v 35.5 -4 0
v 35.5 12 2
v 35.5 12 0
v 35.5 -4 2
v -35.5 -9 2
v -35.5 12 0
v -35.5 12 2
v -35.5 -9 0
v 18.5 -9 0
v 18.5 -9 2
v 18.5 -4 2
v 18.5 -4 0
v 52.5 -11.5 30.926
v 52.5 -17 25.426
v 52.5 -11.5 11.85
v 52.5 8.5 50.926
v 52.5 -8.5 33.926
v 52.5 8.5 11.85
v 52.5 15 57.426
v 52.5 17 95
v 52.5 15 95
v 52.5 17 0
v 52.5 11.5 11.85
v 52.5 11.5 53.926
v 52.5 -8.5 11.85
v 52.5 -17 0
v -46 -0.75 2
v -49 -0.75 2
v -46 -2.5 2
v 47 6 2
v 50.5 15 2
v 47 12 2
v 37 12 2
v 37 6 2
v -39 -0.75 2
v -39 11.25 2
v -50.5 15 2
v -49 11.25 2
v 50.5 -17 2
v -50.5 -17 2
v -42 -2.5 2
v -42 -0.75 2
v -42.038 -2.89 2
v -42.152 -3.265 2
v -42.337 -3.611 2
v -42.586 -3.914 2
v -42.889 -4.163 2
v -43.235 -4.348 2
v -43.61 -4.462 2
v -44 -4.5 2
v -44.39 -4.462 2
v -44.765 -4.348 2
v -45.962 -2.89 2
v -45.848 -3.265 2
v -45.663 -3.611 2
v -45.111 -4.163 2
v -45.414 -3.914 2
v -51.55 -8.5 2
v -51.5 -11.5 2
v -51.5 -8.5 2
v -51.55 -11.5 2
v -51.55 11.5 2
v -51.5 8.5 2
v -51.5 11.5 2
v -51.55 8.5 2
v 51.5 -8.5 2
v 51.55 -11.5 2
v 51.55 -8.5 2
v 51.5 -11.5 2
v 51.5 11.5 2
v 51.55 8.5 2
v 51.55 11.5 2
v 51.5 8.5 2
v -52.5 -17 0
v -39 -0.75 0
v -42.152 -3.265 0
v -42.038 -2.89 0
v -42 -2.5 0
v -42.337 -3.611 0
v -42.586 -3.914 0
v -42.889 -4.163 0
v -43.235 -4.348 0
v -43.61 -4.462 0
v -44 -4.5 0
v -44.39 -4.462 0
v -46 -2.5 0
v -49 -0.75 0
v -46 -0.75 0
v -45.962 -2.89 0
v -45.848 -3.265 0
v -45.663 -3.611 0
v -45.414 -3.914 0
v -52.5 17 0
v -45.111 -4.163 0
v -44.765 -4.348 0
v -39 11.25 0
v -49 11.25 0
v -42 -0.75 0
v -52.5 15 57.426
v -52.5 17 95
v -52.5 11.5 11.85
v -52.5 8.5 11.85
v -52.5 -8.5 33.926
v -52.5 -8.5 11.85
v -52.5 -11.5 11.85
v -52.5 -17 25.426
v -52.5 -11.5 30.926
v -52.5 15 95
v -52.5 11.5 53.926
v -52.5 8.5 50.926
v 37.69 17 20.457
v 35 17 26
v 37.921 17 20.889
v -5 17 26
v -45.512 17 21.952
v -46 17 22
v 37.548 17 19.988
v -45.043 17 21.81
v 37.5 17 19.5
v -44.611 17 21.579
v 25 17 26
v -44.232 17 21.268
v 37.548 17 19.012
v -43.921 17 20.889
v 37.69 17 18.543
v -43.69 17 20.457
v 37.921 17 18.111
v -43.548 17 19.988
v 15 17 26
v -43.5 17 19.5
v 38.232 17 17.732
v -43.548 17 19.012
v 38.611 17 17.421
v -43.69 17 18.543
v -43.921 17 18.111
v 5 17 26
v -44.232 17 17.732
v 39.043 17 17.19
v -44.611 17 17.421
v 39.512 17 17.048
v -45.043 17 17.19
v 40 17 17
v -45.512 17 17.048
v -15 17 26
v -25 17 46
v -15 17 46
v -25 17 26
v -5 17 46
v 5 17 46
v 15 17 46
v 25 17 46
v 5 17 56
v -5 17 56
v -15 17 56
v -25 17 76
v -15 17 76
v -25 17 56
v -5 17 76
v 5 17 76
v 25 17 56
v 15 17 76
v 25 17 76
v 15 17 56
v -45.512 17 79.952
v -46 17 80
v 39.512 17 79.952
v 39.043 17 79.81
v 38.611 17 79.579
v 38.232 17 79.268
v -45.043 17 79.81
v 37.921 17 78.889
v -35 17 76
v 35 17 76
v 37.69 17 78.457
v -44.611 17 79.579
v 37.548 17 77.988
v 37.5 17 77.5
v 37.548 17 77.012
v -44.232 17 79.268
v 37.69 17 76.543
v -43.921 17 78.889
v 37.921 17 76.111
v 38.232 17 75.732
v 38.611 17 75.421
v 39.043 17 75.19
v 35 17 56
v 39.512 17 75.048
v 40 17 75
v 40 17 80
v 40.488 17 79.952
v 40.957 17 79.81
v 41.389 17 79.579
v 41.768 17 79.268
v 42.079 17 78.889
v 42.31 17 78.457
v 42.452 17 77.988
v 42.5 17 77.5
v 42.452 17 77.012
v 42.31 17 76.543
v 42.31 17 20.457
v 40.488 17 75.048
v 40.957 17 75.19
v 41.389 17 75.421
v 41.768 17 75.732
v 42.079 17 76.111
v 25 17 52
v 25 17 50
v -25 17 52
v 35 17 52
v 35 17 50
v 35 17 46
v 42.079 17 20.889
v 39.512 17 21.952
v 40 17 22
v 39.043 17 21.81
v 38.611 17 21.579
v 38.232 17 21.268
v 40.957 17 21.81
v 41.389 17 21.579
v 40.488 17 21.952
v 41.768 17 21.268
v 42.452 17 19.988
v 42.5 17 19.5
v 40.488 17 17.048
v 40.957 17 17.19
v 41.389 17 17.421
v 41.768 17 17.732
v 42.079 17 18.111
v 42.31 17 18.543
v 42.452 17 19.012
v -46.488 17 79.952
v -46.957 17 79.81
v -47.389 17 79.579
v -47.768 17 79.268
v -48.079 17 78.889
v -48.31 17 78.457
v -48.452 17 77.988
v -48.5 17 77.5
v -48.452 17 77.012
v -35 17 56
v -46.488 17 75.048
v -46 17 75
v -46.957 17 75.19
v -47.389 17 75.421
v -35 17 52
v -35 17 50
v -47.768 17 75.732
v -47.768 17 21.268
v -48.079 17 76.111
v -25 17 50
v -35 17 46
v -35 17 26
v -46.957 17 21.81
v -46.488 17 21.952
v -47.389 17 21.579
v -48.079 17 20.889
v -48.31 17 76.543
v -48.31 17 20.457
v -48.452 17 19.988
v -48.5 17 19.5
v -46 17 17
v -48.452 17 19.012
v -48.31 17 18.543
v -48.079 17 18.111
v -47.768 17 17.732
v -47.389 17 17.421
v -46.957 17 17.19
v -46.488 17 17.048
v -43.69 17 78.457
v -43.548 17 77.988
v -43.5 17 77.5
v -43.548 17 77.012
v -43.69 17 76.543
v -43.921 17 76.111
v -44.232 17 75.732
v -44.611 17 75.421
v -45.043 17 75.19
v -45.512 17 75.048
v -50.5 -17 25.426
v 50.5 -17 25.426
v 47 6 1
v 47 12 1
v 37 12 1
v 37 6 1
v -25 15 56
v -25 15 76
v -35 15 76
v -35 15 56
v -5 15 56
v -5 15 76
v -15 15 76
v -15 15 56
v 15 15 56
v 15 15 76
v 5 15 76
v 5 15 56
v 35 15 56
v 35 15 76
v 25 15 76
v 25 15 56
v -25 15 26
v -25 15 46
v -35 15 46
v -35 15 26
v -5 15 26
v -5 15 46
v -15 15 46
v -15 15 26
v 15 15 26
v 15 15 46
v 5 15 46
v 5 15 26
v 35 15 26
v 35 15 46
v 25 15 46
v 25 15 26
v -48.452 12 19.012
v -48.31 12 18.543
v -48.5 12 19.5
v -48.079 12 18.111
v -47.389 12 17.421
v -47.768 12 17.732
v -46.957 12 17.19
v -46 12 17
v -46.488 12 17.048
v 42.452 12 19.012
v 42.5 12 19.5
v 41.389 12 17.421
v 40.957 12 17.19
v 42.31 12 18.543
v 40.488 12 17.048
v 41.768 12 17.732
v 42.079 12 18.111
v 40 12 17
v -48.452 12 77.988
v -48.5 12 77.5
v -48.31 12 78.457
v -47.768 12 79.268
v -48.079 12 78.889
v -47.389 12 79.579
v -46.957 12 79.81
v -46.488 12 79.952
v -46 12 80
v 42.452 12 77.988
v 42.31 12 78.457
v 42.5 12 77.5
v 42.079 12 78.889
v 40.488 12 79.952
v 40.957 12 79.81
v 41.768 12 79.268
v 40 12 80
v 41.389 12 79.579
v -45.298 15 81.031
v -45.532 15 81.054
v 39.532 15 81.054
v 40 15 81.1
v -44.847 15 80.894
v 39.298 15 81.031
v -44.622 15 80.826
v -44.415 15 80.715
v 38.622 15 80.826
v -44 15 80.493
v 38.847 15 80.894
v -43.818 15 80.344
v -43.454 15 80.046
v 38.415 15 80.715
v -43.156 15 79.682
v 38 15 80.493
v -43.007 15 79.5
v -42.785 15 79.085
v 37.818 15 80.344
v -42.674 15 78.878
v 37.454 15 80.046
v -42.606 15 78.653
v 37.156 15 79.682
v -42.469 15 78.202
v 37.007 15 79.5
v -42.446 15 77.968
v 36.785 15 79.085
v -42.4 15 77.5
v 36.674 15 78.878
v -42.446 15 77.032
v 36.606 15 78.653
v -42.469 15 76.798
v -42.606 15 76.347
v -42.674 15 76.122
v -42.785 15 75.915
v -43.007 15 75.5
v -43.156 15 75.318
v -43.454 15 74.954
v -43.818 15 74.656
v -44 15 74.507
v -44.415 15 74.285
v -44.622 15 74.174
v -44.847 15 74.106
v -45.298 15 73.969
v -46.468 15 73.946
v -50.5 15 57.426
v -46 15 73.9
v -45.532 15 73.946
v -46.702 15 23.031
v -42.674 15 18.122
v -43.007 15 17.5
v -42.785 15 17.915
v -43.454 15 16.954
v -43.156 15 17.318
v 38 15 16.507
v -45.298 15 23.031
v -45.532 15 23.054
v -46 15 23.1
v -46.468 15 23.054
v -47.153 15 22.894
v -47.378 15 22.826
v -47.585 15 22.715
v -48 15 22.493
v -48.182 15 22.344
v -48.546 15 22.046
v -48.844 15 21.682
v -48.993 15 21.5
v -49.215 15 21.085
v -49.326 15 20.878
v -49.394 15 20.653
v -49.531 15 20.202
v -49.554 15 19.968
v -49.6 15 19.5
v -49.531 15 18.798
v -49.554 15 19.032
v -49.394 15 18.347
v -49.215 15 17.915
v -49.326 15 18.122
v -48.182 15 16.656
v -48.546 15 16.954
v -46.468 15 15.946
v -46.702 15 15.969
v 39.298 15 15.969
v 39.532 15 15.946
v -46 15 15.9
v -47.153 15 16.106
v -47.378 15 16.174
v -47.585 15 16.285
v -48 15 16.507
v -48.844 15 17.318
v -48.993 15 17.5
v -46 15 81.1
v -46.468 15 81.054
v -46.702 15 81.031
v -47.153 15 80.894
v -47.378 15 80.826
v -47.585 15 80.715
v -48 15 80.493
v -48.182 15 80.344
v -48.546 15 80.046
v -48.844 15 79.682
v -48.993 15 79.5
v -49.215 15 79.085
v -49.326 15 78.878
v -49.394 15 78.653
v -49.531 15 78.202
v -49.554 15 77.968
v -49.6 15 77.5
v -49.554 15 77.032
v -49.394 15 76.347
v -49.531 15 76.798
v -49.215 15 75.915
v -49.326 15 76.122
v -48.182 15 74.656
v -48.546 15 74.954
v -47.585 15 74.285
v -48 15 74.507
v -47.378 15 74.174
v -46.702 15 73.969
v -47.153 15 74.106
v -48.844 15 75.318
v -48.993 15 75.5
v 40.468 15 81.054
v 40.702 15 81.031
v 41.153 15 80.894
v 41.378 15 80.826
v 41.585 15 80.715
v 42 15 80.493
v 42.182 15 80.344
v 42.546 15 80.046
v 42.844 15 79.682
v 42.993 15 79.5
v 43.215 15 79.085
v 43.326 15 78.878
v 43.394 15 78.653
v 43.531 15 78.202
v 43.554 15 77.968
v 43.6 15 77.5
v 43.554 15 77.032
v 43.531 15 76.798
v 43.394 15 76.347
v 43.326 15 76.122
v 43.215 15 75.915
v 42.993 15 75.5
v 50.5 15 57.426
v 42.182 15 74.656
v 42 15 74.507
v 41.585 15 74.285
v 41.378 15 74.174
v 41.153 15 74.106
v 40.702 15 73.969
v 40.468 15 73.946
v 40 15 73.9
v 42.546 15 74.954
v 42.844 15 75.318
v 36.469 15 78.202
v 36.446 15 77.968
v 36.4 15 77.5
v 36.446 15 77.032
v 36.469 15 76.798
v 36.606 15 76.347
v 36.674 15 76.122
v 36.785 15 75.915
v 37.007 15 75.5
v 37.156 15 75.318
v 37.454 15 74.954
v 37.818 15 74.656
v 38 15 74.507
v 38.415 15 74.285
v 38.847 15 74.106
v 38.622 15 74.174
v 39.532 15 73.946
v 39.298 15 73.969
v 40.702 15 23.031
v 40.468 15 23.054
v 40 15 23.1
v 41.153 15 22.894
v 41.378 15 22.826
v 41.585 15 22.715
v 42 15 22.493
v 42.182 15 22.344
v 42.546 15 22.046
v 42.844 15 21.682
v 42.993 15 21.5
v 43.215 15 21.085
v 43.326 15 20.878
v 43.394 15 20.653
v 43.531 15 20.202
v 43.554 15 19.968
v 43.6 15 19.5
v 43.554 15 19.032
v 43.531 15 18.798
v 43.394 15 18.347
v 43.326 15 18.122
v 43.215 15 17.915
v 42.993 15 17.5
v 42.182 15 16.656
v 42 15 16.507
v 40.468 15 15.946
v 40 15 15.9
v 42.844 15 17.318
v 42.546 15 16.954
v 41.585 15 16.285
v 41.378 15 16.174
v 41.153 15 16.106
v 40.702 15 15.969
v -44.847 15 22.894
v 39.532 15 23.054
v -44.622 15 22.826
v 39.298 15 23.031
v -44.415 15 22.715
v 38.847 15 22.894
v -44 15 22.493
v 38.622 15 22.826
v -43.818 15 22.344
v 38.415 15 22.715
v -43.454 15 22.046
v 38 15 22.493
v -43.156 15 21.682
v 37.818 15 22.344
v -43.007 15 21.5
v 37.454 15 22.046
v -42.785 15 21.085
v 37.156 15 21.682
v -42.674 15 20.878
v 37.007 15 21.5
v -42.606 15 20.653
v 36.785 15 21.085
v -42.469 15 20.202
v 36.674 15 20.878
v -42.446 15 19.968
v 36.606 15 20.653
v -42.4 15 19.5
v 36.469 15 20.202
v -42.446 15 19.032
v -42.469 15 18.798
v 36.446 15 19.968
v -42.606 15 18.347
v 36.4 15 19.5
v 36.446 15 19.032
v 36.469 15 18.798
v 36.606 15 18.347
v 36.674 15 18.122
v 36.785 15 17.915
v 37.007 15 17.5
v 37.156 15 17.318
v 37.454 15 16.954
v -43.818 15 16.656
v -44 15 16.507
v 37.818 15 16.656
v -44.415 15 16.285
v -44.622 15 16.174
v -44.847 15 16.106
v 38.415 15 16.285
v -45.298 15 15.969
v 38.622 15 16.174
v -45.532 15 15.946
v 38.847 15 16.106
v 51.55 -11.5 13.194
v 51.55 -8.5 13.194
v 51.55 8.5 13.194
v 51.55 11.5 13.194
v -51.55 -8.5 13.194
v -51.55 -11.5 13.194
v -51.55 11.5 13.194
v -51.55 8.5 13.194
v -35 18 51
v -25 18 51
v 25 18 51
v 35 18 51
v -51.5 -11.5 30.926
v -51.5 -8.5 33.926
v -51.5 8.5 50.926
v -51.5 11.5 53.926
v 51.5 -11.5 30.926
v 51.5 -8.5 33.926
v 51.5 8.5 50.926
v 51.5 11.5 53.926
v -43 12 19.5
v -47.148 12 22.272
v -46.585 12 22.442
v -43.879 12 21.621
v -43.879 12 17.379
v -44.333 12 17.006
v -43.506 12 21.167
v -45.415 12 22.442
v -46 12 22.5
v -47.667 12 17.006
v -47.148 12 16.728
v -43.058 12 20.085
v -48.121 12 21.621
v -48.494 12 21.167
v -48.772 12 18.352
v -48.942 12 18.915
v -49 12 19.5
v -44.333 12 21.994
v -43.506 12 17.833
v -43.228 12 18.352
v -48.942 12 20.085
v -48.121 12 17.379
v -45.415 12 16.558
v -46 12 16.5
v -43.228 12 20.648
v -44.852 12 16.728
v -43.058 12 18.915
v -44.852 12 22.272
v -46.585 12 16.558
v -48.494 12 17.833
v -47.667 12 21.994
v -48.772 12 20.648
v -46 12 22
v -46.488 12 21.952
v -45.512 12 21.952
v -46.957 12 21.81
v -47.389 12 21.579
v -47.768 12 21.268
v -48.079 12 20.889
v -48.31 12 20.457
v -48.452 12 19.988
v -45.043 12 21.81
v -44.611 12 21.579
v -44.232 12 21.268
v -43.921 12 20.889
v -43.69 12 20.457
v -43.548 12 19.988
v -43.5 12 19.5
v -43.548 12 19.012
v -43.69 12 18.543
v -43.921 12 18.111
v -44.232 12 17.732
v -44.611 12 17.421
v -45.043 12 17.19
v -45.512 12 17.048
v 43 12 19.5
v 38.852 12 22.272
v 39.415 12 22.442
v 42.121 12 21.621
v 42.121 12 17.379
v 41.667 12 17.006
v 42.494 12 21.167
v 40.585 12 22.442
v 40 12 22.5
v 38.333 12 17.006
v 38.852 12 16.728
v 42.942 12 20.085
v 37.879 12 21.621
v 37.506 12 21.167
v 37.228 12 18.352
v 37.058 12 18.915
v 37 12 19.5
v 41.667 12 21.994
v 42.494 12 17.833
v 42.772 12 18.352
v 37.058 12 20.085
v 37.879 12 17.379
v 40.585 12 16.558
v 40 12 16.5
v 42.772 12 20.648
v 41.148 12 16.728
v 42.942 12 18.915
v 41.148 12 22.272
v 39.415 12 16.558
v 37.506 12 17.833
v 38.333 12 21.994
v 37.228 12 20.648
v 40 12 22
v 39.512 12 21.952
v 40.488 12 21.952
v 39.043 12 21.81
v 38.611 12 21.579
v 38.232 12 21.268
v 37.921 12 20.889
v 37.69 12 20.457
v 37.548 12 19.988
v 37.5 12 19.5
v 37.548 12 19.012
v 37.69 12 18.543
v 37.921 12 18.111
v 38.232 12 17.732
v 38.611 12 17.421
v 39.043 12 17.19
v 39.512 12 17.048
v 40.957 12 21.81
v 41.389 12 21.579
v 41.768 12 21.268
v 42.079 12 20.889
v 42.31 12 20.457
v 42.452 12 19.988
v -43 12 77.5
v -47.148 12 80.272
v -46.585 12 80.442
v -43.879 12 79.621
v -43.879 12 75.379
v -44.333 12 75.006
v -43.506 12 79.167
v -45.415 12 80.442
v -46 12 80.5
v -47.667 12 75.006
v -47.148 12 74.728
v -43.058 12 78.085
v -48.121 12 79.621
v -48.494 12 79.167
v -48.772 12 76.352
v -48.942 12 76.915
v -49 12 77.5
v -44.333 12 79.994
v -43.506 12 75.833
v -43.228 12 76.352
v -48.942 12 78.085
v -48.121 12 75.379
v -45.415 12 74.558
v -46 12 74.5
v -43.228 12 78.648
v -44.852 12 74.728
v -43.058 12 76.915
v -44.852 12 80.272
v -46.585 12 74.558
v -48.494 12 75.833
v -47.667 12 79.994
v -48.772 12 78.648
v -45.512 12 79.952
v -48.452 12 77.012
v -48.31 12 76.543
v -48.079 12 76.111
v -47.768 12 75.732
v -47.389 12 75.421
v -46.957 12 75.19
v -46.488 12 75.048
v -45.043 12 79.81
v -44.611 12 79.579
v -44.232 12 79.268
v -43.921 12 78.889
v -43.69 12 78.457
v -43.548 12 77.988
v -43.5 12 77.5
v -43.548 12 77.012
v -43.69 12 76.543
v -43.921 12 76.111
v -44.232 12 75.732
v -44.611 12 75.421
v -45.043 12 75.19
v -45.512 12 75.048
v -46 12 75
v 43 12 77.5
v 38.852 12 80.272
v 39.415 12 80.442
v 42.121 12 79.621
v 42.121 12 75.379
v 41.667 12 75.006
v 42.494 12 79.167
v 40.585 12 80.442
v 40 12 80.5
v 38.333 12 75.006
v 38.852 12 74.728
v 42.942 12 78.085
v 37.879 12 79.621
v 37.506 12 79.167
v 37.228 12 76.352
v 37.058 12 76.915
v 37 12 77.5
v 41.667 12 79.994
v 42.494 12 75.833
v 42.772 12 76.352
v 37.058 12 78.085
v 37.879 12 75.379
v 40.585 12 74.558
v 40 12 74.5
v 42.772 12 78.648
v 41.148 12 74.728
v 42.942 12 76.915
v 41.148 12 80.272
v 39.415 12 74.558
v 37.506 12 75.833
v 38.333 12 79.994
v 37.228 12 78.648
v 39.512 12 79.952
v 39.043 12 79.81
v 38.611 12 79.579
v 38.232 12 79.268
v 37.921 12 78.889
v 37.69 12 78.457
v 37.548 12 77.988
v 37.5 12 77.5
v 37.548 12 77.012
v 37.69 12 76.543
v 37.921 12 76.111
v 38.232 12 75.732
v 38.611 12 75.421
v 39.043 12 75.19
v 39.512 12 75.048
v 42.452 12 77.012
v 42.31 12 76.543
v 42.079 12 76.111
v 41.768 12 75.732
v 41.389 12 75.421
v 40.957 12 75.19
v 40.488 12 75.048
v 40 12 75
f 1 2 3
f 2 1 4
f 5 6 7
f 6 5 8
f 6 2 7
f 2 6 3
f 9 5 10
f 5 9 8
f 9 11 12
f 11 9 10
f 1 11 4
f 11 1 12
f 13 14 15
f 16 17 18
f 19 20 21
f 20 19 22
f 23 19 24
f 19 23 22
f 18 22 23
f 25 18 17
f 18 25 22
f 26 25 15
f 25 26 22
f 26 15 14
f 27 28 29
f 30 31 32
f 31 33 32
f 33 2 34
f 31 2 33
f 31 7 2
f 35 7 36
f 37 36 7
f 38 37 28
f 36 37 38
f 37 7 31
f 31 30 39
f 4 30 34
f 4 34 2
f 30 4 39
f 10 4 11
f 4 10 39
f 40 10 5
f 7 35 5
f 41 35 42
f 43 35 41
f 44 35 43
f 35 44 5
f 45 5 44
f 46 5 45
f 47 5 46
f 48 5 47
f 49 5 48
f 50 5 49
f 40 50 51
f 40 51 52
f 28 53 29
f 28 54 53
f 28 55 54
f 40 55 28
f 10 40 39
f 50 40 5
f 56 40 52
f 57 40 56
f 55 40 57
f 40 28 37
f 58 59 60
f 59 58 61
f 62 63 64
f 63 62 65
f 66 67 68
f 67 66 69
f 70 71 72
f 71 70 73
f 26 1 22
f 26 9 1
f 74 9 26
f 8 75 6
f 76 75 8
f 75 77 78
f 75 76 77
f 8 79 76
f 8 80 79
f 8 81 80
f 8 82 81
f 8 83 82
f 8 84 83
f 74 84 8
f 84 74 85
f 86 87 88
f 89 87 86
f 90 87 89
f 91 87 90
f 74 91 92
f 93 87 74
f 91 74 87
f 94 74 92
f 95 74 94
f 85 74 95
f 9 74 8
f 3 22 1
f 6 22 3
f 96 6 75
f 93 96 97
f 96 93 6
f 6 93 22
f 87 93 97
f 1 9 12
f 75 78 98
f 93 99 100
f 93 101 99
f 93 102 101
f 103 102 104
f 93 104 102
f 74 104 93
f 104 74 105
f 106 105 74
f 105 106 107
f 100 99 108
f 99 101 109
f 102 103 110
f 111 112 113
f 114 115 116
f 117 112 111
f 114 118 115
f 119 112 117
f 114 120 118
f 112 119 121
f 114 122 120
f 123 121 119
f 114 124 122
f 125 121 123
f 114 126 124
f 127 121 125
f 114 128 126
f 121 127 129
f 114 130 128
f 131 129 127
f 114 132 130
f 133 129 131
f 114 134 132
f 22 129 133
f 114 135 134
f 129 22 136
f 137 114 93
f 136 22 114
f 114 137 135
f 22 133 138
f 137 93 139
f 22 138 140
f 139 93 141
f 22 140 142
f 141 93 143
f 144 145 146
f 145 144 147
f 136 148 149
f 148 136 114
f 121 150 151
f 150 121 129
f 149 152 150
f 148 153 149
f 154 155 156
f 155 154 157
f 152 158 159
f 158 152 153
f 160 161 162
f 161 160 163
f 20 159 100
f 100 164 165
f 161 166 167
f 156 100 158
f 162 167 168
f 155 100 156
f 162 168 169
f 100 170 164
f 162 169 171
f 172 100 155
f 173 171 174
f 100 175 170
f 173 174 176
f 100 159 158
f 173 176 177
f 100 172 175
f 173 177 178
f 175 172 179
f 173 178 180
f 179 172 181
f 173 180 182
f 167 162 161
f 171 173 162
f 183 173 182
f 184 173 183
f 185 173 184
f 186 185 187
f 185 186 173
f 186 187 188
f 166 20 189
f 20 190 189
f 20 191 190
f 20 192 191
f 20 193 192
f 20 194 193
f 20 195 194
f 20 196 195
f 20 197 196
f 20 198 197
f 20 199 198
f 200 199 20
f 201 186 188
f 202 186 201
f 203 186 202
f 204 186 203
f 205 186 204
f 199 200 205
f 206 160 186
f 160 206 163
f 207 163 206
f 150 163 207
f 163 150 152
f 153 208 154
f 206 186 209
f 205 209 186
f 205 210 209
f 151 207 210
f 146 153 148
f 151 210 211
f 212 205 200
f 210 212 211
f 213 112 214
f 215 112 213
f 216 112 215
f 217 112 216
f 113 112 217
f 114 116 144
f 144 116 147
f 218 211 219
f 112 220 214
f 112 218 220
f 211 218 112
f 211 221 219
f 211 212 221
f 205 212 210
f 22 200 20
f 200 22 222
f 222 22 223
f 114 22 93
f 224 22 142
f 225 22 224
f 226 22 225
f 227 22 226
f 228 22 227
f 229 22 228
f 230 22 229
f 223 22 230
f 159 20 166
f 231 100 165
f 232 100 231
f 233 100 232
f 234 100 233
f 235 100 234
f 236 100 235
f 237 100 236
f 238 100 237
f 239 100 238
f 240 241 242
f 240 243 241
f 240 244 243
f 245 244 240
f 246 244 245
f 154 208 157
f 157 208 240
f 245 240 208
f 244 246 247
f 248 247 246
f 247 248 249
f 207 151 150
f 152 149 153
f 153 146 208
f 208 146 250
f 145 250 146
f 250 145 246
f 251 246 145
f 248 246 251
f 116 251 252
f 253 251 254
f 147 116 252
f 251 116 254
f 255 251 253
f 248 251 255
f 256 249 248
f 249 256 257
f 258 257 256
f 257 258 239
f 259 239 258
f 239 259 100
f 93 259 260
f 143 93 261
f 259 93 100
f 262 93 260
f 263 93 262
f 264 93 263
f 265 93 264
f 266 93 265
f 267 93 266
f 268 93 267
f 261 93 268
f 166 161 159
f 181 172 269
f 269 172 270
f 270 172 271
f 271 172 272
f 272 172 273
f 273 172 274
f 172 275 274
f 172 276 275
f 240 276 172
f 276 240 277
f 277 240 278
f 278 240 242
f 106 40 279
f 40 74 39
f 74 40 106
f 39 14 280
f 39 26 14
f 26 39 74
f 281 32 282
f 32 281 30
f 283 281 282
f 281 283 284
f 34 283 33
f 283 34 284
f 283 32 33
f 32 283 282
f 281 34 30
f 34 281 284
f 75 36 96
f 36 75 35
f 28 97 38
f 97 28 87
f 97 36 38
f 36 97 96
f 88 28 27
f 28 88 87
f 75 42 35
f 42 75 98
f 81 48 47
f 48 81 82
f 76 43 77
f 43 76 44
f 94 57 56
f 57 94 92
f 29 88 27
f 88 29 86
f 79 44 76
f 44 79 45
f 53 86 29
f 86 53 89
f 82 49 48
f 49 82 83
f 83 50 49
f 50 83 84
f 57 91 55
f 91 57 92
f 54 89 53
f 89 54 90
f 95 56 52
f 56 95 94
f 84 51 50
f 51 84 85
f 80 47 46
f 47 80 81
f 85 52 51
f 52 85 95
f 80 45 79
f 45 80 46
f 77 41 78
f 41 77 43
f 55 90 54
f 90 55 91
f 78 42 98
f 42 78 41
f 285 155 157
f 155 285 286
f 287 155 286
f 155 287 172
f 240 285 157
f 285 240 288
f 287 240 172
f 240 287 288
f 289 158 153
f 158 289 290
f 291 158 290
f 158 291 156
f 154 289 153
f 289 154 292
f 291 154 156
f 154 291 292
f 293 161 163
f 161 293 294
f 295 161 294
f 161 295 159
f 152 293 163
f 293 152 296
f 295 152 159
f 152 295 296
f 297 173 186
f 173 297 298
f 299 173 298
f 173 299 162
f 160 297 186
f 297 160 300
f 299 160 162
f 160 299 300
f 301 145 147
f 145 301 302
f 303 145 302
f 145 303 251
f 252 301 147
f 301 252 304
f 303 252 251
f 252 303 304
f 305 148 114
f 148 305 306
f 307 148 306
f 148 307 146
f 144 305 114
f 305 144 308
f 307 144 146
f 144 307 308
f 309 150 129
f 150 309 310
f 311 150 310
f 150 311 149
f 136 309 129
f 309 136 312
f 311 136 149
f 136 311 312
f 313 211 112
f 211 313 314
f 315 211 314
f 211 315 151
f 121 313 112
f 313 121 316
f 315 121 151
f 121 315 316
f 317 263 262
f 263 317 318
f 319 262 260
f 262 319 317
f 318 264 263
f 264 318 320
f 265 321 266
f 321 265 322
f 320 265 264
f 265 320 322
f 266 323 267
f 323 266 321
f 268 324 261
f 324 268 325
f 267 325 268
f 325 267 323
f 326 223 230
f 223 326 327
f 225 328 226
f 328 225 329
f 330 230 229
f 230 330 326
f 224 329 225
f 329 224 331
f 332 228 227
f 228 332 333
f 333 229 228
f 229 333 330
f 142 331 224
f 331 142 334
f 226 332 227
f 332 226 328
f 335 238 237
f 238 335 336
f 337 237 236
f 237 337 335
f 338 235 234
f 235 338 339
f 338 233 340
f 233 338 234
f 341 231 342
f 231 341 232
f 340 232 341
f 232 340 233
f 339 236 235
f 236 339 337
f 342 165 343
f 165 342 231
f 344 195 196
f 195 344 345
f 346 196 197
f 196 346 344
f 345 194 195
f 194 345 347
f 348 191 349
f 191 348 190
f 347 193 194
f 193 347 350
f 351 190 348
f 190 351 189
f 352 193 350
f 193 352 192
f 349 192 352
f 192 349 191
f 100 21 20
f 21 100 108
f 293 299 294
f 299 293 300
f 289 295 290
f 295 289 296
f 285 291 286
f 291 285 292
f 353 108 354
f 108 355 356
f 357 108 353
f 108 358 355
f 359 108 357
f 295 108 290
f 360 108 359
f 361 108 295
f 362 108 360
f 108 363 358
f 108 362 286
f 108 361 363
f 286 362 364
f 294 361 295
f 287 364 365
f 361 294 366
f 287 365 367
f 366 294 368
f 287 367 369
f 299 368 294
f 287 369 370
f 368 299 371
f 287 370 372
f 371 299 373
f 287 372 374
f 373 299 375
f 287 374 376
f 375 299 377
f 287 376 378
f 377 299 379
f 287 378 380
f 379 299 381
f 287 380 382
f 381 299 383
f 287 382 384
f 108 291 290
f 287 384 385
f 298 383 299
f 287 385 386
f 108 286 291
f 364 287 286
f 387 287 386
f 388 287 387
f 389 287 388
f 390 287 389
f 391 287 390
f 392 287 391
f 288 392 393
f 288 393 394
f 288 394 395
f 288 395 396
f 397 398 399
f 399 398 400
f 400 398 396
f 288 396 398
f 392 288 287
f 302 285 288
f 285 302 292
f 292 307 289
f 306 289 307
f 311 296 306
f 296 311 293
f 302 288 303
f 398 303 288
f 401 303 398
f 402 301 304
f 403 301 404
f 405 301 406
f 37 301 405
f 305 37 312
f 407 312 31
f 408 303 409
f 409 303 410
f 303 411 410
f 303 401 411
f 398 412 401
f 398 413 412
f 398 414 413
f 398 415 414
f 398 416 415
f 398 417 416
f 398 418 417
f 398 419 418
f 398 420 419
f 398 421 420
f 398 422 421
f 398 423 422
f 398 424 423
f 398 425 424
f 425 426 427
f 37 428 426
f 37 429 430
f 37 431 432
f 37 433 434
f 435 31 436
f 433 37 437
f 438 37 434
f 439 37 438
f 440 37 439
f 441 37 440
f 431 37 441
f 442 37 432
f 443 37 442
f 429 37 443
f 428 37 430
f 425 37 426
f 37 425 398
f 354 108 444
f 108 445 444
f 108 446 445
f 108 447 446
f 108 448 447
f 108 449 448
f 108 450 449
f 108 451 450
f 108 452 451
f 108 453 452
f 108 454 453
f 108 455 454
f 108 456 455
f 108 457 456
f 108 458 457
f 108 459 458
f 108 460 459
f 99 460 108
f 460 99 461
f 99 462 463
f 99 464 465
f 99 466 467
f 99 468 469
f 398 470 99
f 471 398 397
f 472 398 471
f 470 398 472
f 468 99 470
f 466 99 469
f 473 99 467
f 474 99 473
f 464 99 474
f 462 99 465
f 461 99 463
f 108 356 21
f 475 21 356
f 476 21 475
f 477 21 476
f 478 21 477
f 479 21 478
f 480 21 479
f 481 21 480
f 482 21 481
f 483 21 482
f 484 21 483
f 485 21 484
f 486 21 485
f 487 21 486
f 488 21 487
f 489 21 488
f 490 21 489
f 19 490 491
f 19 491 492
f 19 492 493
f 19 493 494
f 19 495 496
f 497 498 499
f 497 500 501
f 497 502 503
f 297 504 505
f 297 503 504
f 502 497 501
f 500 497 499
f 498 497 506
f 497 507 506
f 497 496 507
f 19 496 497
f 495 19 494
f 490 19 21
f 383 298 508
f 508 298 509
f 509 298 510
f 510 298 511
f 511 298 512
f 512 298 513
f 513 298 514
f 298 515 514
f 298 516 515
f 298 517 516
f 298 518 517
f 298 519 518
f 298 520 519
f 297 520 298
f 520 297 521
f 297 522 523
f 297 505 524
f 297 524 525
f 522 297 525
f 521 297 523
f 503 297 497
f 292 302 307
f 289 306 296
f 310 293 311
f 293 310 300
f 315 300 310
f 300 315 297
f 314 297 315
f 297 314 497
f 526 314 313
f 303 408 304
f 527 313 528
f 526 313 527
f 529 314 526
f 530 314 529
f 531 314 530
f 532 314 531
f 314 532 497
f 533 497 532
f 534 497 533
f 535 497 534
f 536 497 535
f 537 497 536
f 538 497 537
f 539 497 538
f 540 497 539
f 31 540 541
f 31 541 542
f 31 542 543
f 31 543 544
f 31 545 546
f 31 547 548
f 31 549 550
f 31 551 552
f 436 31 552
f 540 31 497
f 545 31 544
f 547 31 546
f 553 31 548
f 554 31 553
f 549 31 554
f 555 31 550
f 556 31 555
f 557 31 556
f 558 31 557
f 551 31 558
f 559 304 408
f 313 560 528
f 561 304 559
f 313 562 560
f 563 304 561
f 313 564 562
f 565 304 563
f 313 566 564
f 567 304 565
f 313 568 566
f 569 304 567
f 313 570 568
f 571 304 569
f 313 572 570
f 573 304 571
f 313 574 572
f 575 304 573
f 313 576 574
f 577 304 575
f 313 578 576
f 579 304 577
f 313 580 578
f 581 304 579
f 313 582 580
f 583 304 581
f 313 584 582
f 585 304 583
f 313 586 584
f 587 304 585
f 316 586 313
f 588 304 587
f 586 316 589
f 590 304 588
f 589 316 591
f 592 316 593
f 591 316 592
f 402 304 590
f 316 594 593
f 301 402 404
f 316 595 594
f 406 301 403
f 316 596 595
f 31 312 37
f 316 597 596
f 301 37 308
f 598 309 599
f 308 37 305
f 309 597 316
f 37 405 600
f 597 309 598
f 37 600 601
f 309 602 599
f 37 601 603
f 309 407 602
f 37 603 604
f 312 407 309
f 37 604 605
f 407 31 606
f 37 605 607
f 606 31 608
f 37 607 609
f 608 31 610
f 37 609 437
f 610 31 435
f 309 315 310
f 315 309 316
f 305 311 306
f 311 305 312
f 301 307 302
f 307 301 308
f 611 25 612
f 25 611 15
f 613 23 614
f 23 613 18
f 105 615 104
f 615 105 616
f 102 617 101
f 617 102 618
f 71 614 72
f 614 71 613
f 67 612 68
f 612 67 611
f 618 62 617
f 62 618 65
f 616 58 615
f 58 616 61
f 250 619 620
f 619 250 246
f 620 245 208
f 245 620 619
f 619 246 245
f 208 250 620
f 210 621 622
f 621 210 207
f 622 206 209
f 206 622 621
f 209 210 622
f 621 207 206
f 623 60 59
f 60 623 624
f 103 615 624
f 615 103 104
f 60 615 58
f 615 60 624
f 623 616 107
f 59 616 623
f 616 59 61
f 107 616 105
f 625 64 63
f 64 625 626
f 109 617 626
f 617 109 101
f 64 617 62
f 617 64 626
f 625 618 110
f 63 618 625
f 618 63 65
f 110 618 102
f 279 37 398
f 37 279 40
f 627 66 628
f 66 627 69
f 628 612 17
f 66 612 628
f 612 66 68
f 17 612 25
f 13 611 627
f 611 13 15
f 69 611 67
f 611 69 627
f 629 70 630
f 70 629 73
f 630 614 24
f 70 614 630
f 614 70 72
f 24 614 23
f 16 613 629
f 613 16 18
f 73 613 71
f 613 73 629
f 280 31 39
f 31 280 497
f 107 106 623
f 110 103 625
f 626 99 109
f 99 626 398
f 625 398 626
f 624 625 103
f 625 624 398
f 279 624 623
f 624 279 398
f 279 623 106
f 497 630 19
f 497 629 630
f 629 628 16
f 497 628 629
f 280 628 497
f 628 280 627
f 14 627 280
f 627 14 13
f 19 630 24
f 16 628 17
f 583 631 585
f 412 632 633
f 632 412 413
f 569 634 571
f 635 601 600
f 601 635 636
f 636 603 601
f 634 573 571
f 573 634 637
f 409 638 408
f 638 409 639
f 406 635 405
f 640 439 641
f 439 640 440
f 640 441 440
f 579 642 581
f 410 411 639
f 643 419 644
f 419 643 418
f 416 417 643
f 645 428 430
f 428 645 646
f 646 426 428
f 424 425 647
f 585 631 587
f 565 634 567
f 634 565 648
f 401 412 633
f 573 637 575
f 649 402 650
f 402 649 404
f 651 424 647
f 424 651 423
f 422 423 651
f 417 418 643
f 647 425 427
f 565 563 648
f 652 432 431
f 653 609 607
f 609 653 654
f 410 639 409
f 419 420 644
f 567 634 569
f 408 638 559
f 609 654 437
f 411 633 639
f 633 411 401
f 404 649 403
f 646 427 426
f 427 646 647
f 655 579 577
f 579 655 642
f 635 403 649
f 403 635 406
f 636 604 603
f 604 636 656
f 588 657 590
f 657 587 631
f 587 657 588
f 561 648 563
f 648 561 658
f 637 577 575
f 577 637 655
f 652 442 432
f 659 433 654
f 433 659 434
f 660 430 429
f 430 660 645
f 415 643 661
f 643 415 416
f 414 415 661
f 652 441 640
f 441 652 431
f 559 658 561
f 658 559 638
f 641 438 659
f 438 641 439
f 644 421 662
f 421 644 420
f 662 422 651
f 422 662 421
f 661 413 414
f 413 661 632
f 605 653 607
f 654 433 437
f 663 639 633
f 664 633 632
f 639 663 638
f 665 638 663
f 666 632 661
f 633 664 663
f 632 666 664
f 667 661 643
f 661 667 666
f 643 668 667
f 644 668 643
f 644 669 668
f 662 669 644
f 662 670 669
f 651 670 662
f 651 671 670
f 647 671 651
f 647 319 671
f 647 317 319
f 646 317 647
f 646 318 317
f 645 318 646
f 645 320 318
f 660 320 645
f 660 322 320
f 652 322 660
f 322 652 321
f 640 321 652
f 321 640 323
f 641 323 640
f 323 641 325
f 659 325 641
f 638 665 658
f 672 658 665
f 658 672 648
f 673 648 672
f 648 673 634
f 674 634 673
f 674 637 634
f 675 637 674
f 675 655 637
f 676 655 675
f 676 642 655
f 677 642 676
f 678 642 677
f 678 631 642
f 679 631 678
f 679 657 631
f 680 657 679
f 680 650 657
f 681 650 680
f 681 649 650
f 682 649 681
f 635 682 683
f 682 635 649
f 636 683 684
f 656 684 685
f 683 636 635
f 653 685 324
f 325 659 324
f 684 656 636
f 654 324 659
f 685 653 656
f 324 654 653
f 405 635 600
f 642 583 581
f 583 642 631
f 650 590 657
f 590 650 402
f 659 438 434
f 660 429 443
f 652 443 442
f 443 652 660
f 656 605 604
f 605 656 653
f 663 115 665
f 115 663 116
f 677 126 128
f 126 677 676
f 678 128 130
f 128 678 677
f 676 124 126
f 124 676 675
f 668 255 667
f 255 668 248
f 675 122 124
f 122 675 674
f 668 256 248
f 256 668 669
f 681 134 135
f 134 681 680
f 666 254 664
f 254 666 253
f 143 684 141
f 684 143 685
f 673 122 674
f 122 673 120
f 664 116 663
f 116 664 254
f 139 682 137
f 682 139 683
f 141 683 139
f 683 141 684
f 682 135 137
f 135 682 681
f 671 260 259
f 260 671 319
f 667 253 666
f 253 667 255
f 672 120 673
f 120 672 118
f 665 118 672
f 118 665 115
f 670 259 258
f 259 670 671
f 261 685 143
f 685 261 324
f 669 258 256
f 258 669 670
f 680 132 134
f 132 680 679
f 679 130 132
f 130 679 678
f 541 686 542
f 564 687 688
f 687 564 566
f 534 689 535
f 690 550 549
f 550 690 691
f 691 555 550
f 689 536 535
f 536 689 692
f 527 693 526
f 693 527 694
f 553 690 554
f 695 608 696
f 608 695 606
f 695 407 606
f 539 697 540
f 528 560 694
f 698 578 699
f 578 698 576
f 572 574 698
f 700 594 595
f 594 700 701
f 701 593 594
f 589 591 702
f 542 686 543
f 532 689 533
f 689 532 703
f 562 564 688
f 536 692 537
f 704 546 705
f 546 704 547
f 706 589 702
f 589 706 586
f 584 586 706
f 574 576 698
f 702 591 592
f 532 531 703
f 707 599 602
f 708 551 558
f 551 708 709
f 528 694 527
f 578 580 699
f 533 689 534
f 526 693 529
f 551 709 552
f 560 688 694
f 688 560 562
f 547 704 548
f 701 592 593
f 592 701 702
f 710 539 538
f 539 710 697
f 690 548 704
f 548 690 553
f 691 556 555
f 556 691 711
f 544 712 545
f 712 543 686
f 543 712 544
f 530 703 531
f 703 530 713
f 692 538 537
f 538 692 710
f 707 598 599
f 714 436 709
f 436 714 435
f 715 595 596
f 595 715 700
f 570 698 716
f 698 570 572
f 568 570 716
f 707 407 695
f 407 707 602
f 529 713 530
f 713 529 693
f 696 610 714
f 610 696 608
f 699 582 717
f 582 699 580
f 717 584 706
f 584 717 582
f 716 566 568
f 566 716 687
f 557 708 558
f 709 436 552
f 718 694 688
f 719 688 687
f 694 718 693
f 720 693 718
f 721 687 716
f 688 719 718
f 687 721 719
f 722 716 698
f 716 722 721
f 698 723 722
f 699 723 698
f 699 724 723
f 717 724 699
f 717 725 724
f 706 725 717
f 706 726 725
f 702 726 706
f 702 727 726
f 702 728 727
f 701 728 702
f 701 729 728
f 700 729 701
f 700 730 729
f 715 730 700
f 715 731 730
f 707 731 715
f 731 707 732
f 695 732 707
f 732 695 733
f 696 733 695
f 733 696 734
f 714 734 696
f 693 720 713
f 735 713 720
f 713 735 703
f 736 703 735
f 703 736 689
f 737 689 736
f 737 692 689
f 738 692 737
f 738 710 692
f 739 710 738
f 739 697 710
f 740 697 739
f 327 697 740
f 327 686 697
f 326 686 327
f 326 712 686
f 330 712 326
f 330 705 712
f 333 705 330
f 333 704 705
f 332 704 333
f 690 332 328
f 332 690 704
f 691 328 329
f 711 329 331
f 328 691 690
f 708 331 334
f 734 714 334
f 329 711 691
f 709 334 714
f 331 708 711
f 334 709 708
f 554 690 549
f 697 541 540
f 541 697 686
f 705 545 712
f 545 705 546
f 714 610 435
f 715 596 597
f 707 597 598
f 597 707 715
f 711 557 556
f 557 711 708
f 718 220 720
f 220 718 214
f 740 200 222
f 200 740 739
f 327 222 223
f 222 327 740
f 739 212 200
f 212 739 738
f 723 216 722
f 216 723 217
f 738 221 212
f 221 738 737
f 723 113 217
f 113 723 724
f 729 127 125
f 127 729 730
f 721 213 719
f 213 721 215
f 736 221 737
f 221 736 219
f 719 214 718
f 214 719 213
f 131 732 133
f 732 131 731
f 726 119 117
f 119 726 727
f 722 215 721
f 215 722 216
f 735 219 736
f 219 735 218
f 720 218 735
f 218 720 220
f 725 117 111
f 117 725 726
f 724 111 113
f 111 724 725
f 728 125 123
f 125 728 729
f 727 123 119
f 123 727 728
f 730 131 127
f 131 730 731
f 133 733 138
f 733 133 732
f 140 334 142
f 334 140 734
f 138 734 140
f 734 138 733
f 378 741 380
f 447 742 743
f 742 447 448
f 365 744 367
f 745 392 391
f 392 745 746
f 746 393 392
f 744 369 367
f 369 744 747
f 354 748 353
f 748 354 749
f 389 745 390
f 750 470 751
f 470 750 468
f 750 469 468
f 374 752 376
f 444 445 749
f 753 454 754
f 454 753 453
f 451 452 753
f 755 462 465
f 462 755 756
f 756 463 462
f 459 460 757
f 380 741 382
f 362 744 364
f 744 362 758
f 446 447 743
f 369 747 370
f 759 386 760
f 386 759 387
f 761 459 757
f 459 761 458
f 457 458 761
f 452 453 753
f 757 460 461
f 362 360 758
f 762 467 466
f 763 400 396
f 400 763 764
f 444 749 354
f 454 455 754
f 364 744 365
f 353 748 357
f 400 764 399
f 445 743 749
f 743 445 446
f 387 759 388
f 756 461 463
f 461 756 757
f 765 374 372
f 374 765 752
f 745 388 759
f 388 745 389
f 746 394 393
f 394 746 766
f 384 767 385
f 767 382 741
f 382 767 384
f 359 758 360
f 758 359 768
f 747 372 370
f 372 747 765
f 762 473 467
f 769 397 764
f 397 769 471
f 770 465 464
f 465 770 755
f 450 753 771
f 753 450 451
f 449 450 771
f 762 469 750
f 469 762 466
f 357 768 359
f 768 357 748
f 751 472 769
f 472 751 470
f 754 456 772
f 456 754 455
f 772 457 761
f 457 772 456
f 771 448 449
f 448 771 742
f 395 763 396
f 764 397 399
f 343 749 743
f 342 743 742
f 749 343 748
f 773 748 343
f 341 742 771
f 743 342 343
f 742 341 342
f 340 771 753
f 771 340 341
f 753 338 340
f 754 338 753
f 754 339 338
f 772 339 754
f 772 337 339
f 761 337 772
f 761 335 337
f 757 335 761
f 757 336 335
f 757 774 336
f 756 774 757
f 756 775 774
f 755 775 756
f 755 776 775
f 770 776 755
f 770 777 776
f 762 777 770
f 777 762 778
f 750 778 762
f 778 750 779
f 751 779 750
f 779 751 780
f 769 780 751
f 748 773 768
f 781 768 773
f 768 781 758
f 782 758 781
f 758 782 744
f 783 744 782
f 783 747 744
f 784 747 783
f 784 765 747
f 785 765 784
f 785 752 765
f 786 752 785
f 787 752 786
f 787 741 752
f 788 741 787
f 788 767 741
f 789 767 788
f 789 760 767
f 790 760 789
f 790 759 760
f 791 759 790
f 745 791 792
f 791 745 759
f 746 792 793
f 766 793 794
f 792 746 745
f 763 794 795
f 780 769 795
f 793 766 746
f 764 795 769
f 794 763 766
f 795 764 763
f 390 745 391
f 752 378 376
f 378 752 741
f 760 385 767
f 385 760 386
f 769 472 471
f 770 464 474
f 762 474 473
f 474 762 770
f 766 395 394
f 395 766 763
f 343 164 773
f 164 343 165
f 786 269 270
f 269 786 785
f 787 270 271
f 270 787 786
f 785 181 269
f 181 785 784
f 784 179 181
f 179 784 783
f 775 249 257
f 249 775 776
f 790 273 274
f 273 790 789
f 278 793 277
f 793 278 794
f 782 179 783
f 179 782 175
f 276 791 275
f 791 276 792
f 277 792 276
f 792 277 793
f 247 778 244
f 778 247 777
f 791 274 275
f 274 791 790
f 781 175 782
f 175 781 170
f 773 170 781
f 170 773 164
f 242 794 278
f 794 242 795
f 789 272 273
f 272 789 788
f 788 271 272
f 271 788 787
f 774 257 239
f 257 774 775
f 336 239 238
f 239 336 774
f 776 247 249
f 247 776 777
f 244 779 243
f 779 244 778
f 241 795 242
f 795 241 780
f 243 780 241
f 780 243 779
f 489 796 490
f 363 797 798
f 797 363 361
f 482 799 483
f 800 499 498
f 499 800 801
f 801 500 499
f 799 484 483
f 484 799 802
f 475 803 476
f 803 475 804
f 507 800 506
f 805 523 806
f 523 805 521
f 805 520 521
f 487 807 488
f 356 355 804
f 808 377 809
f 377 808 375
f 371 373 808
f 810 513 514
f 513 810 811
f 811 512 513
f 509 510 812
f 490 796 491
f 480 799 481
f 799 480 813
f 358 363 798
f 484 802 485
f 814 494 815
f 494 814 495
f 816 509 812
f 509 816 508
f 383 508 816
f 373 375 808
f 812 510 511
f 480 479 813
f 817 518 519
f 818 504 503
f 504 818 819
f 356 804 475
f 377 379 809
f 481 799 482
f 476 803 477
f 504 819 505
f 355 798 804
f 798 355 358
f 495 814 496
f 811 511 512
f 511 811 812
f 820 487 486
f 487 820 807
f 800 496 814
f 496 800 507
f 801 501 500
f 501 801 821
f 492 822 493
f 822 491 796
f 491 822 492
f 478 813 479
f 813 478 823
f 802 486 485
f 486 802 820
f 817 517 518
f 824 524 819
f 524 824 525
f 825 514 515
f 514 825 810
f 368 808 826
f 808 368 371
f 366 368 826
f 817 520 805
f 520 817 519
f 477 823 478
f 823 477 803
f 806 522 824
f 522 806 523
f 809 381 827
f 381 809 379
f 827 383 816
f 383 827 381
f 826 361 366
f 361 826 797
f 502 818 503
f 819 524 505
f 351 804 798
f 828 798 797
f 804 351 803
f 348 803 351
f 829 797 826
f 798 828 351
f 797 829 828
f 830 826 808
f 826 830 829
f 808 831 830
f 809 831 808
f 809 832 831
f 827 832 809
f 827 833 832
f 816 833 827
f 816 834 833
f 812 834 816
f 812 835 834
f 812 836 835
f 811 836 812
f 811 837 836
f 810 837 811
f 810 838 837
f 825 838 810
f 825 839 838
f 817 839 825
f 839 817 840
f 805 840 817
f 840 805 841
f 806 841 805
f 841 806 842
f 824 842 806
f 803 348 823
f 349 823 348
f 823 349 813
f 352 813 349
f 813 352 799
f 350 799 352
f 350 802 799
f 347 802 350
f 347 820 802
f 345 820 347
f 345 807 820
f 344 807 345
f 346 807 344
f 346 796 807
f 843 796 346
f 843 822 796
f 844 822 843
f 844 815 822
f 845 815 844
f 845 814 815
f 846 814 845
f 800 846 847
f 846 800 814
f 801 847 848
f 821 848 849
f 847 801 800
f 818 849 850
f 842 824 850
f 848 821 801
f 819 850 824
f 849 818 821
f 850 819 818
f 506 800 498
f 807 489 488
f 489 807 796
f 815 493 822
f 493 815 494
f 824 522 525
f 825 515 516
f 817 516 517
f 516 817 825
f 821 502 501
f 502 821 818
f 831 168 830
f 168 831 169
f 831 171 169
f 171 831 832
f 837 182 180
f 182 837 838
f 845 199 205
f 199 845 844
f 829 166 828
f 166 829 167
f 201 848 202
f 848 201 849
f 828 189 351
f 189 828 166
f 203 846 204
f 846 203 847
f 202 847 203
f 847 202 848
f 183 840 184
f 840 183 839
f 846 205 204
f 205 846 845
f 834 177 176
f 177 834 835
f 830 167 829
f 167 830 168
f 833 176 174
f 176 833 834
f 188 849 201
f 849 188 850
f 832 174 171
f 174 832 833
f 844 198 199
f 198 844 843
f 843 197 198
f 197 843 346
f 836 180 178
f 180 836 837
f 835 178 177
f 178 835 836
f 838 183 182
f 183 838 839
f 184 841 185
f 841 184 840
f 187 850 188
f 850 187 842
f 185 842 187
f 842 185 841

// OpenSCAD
W=106-1;
H=35-1;
difference() {

  cube_center([W, H, 2]);
    
    difference() {
        translate([0,1.5,-.3])
        cube_center([71, 21, 5]);
        
        translate([54,-16])
        translate([0,1.5,-.3])
        cube_center([71, 21, 10]);
    }
    
    
    // usb
    translate([42.,9,1])
    cube_center([10, 6, 5]);
    
    // power
    translate([-44,,5.25,-.3])
    cube_center([10, 12, 5]);
    
    translate([-44,-2.5,-.3])
    minkowski() {
        cylinder(d=4,h=50,center=true,$fn=32);
        cube([0.0001,3,0.0001]);
    }
}


difference() {
translate([0,H/2-1,0])
cube_center([W, 2, 95]);

for(i=[-30,-10,10,30])
translate([i,H/2-1,56])    
cube_center([10, 3, 20]);

for(i=[-30,-10,10,30])
translate([i,H/2-1,26])    
cube_center([10, 3, 20]);

translate([-3,H/2,47.75+0.75])
rotate([90,0,0])
xaviernxminus();
    
}

difference() {
    union() {
        cube_center([W,H,10-.15]);
    translate([0,0,10-.15])
    minkowski() {
        cube_center([W-2,H-2,2]);
        rotate([0,0,45])
        cylinder(d1=2*sqrt(2),d2=0,h=2/sqrt(2),$fn=4);
    }
}
    
    cube_center([W-2+.1,H+5+.1,50]);
}

for(s=[-1,1])
translate([s*30,H/2,50+1])
rotate([0,90,0])
cylinder(d=2,h=10,$fn=4,center=true);


difference() {
    // side panels
for(s=[-1,1])
    scale([s,1,1]) {
        difference() {
    translate([W/2-1,0,0])
    cube_center([2,H,90]);
            // rails
            for(t=[-1,1])
    translate([W/2-1+2-1,t*10,0])
    cube_center([2,3,90]);
            
        }
    }
    
    rotate([45,0,0])
    translate([0,0,30])
    cube_center([200,200,200]);
    
}


translate([-3,H/2,47.75+0.75])
rotate([90,0,0])
xaviernx();

module xaviernx() {
    translate([-86/2,-58/2,0])
    standoff();
    
    translate([86/2,-58/2,0])
    standoff();
    
    translate([-86/2,58/2,0])
    standoff();
    
    translate([86/2,58/2,0])
    standoff();
}

module xaviernxminus() {
    translate([-86/2,-58/2,0])
    cylinder(d=5,h=5,$fn=32);
    
    translate([86/2,-58/2,0])
    cylinder(d=5,h=5,$fn=32);
    
    translate([-86/2,58/2,0])
    cylinder(d=5,h=5,$fn=32);
    
    translate([86/2,58/2,0])
    cylinder(d=5,h=5,$fn=32);
}


module standoff() {
    difference() {
        cylinder(d1=8,d2=6,h=5,$fn=32);
        cylinder(d=5,h=10, $fn=32);
    }
}

/*difference() {
    cube_center([W, H, 2]);
    for(i=[-10:5:10]) for(j=[-47.5:5:47.5])
    translate([j,i,-.1])
    cube_center([3,3,5]);
}*/


//translate([-34.8,4,41.75]) rotate([90,0,0]) import("/home/dheera/code/3d/rack/Jetson_Xavier_NX_DevKit_LQ.stl");


module cube_center(dims,r=0,$fn=64) {
    if(r==0) {
        translate([-dims[0]/2, -dims[1]/2, 0])
        cube(dims);
    } else {
        minkowski() {
            translate([-(dims[0]-2*r)/2, -(dims[1]-2*r)/2, 0])
            cube([dims[0]-2*r,dims[1]-2*r,dims[2]]);
            cylinder(r=r,$fn=$fn,h=0.0001);
        }
    }
}
